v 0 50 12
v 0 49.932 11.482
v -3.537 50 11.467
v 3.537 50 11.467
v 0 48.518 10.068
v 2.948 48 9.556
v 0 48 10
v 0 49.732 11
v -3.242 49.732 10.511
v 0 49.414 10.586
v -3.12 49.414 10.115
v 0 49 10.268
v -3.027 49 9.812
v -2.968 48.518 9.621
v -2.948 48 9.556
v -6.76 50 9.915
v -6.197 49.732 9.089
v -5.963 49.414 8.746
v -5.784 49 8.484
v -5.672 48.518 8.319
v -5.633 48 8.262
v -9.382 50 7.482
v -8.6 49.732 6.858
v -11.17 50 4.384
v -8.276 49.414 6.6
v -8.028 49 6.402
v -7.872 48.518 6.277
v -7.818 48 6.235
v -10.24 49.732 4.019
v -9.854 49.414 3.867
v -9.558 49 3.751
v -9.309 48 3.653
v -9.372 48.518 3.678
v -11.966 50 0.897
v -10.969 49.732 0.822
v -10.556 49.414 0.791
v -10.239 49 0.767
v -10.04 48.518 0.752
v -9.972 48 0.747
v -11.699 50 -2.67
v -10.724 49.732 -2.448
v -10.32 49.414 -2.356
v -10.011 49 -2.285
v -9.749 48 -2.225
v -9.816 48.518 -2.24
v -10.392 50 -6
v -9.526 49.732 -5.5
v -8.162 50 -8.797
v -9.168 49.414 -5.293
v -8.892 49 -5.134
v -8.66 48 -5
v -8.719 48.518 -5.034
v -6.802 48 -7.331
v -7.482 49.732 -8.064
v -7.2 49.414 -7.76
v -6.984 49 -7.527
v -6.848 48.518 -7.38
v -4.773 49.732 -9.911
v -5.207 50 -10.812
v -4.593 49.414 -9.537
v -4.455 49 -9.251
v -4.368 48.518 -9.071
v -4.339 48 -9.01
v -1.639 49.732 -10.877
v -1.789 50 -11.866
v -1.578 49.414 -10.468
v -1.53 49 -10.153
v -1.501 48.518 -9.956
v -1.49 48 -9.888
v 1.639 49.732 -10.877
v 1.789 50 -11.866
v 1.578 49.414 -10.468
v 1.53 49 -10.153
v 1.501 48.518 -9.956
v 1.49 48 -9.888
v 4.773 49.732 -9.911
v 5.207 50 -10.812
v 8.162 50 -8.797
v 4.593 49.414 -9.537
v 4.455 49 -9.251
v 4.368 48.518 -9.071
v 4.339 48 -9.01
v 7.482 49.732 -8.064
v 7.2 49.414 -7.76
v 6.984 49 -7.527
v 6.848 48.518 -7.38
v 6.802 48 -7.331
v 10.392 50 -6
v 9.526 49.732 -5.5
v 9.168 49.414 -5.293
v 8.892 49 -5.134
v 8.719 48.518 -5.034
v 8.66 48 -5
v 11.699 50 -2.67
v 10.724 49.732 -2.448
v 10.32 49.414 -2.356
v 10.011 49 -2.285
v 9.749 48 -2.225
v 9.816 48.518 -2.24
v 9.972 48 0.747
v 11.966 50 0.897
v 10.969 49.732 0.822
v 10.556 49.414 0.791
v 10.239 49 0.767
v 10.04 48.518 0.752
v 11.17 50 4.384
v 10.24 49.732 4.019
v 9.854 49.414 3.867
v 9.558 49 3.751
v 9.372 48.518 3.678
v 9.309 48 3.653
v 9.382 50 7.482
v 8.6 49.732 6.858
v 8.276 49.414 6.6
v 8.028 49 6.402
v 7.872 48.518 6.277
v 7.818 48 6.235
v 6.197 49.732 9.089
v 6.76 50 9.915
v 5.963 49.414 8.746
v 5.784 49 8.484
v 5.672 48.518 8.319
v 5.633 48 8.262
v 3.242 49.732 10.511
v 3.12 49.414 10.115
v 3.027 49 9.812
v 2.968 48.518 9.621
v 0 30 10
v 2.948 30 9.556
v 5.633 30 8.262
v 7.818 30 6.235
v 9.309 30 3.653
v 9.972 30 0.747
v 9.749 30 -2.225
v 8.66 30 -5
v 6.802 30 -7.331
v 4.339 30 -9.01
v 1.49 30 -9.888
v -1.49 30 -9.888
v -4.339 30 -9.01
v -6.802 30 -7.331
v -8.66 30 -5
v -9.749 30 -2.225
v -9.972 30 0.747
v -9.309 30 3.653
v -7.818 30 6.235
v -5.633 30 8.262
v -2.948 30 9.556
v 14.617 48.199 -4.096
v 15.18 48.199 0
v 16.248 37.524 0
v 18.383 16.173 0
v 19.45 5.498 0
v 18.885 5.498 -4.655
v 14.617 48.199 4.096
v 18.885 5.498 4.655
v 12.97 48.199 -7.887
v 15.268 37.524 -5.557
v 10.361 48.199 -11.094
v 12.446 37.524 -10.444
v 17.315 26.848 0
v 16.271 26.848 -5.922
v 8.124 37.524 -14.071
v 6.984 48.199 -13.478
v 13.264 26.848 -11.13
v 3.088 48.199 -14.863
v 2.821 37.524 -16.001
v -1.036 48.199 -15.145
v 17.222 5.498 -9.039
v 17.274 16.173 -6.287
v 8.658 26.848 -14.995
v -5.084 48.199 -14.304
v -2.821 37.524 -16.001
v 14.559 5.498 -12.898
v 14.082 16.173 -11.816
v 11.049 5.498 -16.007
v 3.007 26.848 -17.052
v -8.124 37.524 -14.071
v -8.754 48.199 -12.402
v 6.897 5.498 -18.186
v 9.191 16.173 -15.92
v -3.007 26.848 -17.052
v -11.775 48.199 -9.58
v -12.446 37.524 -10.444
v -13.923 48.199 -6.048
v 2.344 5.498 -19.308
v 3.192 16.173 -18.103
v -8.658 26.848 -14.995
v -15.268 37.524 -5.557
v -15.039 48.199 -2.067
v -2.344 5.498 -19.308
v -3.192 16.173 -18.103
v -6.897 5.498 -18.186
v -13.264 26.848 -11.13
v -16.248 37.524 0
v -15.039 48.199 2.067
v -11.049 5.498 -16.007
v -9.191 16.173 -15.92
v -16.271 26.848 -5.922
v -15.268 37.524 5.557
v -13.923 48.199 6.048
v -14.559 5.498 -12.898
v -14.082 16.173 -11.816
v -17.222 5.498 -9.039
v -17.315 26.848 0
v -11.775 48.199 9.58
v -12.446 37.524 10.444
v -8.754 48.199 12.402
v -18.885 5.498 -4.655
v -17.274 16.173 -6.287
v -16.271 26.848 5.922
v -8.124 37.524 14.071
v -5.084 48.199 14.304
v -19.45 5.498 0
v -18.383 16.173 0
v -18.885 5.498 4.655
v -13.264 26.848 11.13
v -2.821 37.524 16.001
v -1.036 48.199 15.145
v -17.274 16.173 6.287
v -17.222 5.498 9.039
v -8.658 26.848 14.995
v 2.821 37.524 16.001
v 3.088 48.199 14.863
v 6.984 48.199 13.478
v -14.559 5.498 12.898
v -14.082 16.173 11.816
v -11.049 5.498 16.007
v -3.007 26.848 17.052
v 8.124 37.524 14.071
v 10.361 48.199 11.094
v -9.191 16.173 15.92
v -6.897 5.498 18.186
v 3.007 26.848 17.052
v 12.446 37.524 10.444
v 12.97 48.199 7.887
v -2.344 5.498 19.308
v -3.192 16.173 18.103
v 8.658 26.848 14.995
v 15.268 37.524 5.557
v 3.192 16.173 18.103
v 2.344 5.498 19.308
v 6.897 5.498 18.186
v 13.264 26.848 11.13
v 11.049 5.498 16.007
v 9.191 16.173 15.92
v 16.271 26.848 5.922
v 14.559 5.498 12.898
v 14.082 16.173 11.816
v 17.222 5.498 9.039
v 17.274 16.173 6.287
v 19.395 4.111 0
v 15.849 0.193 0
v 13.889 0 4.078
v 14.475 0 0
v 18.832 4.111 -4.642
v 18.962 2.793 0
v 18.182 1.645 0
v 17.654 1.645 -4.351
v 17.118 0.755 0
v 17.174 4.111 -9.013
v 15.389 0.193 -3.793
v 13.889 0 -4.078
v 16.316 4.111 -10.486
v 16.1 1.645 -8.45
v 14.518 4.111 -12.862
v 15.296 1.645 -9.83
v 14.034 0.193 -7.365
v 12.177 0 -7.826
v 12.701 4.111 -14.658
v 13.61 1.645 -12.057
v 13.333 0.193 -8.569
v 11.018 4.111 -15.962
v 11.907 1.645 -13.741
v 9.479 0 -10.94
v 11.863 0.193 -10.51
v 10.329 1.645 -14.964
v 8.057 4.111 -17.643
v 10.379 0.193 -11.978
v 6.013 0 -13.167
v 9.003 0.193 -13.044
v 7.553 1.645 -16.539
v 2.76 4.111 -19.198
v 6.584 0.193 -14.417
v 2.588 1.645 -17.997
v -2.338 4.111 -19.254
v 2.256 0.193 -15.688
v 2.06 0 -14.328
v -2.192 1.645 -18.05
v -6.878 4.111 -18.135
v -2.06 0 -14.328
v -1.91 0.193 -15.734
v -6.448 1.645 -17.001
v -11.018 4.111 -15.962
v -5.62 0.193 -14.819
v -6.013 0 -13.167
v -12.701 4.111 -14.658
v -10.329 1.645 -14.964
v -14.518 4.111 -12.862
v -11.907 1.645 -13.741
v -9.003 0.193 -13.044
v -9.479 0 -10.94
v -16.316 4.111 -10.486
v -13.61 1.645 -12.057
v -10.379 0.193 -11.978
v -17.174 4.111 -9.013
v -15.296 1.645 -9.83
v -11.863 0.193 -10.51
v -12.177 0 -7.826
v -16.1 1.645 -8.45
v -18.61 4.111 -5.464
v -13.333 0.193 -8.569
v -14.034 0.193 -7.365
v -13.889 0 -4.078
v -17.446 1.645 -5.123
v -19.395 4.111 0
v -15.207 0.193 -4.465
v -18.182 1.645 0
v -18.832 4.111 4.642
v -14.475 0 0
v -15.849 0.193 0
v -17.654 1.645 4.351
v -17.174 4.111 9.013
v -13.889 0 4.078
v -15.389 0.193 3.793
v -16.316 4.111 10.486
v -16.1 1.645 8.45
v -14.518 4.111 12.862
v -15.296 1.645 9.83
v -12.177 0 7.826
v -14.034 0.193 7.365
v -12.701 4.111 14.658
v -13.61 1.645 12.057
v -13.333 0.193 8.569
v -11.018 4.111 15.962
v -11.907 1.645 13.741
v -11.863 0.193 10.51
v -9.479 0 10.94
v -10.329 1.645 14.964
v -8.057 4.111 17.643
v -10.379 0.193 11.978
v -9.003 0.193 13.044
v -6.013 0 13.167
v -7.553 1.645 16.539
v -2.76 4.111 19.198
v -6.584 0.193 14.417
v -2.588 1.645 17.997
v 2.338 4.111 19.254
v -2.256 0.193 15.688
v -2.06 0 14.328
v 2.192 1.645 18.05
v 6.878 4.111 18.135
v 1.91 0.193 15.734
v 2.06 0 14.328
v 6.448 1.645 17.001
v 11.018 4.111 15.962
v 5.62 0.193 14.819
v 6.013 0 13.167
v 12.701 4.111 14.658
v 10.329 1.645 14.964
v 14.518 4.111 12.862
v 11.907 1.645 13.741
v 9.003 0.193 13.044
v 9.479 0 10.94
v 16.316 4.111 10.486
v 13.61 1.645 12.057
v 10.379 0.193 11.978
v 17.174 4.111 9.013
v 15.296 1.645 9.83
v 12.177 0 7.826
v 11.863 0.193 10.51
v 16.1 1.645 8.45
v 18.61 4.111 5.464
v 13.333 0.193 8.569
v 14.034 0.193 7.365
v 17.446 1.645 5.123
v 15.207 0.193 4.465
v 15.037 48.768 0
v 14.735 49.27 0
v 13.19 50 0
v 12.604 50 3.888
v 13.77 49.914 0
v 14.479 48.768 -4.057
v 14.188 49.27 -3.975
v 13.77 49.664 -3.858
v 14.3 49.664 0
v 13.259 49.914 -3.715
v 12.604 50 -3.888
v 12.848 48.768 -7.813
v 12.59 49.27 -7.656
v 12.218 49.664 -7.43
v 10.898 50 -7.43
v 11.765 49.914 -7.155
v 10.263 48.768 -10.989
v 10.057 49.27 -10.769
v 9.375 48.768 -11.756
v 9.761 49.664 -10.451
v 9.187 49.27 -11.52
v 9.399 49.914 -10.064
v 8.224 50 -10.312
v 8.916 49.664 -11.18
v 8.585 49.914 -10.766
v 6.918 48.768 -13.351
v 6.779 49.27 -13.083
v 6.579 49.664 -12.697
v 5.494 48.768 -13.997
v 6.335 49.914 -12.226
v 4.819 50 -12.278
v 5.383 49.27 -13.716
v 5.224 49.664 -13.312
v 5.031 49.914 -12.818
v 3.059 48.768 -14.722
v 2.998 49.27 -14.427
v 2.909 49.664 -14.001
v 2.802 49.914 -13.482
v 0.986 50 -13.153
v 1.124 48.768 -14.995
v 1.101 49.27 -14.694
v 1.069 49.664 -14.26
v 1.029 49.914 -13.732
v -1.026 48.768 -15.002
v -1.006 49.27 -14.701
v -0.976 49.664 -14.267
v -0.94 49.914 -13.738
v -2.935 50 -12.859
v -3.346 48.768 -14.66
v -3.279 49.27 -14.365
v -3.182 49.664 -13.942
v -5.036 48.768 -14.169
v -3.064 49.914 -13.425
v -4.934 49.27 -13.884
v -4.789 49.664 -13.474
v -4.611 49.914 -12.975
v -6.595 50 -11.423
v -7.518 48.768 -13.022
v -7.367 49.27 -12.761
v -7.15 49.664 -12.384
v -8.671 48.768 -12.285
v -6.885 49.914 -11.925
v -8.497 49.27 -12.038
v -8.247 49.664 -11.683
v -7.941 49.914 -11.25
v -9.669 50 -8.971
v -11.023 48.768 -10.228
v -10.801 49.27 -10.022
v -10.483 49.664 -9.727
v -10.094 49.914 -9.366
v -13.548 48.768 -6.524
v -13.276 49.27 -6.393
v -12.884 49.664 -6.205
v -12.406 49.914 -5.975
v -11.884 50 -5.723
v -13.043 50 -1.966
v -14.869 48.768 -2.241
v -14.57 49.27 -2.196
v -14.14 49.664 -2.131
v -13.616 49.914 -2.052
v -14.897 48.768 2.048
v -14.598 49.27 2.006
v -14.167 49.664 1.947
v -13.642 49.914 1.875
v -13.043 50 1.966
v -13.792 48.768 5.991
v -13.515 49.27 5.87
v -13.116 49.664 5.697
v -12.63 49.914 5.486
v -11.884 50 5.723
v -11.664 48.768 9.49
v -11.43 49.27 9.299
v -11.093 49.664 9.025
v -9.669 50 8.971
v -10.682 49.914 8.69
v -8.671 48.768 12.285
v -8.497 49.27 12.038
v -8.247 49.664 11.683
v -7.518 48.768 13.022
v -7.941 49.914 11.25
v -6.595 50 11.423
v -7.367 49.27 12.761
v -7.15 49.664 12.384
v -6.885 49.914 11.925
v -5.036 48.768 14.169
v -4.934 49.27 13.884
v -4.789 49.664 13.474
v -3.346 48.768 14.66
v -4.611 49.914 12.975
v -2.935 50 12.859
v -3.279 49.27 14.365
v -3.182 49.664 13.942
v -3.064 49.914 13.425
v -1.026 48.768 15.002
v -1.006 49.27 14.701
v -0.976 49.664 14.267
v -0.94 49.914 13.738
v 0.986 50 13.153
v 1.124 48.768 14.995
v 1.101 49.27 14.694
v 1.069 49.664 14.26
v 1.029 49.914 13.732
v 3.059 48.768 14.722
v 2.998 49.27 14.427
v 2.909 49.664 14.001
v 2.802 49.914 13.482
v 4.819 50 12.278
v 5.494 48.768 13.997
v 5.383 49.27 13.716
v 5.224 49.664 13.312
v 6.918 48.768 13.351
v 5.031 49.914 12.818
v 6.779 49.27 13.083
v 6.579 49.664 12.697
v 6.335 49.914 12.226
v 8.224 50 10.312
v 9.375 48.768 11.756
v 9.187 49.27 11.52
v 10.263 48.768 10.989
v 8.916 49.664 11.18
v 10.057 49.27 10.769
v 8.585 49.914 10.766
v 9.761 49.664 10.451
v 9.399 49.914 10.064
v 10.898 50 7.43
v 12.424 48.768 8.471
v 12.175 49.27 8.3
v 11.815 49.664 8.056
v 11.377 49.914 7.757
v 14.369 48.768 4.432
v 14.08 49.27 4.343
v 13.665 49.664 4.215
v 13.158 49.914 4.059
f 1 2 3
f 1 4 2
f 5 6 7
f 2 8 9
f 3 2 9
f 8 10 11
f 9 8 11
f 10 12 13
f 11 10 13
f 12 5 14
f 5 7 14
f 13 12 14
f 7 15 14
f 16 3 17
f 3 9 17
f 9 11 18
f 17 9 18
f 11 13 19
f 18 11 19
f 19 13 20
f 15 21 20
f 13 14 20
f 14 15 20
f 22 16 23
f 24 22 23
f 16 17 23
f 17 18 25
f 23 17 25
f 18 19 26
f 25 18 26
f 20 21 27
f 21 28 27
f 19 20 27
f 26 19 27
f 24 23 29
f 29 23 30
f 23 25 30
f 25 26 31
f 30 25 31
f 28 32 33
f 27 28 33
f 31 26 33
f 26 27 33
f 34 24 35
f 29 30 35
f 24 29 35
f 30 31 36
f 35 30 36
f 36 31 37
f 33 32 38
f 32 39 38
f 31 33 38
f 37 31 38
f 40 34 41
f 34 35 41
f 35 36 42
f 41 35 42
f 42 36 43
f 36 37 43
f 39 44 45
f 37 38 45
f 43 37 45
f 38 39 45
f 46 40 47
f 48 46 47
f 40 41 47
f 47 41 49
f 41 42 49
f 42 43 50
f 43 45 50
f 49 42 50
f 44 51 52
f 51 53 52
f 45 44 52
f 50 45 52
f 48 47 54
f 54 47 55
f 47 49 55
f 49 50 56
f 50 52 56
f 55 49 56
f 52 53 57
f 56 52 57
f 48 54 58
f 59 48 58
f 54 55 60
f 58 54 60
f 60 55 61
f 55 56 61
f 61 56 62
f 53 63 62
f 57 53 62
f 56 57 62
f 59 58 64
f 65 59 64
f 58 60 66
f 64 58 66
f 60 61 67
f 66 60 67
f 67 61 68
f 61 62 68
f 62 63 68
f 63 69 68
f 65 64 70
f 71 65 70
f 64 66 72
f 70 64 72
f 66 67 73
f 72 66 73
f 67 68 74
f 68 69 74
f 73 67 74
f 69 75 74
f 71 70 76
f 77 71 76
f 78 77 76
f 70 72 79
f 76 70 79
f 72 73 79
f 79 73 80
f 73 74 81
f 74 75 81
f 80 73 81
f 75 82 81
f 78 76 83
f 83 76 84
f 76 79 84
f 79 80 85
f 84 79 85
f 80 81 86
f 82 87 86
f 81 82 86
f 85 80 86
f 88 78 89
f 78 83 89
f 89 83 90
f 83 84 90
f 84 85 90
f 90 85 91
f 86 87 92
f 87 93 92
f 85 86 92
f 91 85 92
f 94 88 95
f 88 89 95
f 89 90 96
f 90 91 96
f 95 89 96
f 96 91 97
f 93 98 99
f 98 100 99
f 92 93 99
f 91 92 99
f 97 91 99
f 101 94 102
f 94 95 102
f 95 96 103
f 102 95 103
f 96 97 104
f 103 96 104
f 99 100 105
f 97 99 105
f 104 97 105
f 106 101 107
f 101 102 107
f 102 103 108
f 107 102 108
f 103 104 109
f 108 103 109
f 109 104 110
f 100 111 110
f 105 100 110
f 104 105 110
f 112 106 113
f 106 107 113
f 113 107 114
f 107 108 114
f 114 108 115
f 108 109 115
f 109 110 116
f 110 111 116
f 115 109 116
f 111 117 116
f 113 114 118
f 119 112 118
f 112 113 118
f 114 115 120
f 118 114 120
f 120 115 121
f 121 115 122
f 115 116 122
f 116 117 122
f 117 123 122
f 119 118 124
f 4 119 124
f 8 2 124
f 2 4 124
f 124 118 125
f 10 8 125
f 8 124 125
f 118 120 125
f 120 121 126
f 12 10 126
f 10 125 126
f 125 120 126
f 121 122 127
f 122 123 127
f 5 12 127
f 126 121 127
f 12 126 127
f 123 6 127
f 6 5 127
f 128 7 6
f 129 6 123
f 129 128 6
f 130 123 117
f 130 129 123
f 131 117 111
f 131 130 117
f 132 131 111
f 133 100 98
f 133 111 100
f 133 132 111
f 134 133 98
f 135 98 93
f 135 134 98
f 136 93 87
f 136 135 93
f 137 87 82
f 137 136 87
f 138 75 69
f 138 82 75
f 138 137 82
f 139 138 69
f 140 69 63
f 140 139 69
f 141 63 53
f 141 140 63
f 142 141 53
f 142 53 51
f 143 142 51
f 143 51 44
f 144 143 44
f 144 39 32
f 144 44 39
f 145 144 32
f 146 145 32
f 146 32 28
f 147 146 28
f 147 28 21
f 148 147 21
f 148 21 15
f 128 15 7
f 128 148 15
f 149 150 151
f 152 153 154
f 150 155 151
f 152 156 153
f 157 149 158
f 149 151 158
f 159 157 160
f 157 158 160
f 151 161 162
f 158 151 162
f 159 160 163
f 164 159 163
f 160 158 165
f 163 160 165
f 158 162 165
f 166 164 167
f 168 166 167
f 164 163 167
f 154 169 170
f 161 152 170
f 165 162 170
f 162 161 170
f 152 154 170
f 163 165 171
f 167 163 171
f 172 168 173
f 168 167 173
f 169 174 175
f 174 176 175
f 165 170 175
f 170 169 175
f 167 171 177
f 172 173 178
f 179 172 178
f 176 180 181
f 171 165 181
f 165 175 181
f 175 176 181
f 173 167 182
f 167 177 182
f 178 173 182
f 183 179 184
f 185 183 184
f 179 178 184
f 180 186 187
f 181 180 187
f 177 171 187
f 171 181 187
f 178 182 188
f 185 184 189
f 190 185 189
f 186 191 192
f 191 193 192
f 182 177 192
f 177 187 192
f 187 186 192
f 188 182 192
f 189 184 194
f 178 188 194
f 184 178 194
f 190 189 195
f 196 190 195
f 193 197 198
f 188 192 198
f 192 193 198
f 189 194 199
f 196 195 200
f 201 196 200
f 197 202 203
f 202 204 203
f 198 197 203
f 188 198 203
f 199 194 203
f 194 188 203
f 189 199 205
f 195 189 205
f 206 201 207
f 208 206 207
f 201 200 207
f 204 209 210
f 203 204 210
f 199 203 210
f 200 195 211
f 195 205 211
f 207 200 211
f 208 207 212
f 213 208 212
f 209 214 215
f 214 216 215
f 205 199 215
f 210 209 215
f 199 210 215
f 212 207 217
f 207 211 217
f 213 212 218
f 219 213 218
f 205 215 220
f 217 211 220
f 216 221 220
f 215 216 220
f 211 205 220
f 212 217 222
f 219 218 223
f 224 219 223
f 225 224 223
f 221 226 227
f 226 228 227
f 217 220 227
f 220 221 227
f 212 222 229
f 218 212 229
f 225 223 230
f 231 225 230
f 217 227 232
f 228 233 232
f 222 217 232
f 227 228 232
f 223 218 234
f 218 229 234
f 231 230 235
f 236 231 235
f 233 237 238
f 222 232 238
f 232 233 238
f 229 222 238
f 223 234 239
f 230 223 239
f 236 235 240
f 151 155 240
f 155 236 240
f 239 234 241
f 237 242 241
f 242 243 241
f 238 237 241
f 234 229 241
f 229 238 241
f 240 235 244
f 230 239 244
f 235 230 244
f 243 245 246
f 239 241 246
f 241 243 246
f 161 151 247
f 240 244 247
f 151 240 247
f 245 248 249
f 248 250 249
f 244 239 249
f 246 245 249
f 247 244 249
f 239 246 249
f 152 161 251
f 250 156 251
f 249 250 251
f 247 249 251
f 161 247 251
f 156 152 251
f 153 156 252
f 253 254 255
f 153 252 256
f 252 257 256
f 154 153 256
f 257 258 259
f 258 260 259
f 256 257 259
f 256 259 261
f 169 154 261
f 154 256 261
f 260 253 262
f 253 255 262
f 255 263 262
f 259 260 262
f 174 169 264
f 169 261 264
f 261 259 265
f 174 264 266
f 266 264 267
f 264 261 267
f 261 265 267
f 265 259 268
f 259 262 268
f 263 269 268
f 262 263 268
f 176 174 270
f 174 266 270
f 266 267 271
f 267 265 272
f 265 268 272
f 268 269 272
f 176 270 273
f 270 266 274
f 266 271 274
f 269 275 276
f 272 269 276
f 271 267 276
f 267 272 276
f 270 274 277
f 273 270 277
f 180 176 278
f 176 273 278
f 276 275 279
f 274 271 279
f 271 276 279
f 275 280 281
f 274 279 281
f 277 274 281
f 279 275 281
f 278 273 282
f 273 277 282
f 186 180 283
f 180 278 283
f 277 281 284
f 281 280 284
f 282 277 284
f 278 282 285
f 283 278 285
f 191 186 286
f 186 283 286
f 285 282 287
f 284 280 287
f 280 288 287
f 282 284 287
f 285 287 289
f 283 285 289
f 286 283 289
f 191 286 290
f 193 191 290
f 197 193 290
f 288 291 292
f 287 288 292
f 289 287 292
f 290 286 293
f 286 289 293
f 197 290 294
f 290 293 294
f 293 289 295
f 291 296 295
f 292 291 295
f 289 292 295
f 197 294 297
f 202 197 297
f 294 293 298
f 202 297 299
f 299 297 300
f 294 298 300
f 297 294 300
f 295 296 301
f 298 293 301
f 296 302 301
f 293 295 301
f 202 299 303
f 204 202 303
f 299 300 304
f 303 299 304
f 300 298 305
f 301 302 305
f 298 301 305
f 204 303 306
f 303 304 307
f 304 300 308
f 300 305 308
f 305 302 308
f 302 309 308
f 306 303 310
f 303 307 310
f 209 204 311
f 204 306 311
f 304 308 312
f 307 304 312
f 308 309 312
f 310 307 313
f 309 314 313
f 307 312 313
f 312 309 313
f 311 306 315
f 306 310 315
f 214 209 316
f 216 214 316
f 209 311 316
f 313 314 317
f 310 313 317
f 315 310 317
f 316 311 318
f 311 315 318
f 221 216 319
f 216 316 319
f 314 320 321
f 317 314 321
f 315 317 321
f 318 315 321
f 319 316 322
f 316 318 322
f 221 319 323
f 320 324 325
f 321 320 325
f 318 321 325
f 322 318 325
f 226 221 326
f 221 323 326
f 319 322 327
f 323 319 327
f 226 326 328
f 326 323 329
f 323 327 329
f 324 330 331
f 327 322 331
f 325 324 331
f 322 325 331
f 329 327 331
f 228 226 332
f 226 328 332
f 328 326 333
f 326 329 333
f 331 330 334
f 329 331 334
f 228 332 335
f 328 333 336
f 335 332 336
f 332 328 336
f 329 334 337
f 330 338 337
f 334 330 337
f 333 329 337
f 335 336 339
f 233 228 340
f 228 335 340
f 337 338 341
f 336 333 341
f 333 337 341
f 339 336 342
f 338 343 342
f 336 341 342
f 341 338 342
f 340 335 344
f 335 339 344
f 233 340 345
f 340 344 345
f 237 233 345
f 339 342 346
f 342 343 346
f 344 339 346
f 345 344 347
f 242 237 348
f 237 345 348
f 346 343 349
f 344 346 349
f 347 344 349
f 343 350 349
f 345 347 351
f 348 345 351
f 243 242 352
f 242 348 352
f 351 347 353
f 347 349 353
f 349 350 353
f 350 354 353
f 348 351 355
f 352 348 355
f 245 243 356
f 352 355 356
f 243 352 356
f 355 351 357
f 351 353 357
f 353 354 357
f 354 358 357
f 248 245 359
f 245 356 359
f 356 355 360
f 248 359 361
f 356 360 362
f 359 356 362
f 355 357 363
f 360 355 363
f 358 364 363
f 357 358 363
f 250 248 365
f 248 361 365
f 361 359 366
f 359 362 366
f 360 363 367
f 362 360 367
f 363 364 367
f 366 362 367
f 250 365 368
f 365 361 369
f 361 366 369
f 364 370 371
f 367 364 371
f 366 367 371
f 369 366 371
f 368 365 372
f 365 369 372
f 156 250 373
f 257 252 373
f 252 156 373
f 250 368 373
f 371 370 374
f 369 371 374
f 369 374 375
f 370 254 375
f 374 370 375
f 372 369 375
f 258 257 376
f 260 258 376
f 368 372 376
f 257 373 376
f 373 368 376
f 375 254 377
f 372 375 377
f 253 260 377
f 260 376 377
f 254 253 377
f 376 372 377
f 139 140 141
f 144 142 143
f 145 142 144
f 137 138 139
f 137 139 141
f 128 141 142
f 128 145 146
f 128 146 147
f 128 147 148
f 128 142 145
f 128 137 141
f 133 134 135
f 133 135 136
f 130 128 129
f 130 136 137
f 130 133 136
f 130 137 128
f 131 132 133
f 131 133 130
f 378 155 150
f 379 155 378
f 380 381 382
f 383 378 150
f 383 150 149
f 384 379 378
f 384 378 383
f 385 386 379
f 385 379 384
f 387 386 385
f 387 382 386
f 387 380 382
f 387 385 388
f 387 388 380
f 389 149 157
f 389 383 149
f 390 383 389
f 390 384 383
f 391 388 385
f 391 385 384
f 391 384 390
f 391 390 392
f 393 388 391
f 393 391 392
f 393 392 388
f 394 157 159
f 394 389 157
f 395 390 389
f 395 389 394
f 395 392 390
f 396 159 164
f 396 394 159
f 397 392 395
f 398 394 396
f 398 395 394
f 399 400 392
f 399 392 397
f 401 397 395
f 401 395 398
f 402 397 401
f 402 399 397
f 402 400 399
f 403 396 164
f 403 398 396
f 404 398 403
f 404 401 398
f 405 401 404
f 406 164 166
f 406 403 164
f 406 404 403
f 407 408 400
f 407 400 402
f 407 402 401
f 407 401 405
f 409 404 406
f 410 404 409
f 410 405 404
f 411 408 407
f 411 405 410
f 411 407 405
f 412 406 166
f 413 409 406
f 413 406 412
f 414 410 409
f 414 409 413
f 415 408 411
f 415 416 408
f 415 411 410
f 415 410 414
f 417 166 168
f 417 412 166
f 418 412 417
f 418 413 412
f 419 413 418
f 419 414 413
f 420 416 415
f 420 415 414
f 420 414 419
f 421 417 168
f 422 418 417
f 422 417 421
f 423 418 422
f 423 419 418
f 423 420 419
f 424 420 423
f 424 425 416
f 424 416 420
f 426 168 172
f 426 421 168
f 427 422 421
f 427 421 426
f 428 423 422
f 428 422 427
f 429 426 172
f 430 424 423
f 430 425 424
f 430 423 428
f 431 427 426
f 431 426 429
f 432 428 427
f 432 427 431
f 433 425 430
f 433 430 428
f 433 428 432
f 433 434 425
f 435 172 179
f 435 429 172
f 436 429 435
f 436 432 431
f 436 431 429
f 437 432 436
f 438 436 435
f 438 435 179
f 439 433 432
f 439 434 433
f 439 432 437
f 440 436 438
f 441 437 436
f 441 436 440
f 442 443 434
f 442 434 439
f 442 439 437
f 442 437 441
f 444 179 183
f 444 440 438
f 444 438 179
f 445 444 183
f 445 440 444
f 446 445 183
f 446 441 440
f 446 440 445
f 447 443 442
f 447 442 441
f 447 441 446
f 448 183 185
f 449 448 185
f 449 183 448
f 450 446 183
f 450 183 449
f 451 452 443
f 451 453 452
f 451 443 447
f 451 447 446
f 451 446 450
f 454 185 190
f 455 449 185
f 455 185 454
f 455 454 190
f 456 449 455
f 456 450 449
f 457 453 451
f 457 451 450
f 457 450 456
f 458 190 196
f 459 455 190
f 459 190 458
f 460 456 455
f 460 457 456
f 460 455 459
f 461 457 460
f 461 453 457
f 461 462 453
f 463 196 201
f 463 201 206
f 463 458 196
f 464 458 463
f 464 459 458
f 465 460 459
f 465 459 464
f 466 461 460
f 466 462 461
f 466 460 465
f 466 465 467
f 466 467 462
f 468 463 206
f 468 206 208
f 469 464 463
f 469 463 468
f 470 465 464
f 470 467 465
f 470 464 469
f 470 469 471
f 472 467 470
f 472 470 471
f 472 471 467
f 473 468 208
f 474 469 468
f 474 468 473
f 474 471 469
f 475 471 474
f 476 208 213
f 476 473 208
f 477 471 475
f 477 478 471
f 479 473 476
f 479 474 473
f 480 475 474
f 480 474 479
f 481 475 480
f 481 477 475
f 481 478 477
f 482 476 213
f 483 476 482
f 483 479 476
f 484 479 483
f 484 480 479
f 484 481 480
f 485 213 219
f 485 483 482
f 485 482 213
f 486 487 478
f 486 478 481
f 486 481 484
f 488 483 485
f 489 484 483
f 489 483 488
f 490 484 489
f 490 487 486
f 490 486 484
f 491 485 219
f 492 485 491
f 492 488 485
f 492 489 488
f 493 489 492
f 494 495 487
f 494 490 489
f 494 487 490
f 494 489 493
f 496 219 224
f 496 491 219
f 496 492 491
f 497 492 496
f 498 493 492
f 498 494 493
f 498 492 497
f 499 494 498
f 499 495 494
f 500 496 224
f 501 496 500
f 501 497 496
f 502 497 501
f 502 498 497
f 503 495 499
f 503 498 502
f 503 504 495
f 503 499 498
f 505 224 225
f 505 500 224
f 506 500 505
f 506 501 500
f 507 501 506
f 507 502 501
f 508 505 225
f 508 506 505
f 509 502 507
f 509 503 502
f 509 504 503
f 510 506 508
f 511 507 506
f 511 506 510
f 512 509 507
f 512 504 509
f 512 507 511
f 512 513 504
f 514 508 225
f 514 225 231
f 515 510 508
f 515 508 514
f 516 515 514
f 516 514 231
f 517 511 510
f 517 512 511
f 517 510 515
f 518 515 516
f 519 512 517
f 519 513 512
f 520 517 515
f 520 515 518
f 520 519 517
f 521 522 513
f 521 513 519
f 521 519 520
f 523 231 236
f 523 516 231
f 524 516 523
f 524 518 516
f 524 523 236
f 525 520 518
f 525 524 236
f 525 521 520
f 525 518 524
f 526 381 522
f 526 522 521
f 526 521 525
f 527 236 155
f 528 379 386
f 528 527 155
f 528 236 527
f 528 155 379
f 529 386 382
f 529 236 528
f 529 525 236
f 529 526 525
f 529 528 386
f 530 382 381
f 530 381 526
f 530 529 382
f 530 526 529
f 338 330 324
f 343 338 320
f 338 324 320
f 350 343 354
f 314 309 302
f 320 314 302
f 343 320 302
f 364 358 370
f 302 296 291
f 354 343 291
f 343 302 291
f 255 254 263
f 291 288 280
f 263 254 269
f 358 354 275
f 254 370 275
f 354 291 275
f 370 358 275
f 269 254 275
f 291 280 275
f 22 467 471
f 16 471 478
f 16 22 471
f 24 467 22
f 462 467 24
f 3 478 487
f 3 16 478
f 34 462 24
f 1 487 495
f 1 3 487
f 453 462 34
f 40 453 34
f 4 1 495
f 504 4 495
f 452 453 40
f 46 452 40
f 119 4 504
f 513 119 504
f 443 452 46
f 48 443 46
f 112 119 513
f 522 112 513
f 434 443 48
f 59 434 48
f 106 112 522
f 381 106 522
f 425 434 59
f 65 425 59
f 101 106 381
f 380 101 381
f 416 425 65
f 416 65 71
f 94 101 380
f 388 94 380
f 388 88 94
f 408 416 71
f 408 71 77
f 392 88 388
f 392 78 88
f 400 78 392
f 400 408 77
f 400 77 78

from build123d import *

# Parameters (mm, degrees)
SKETCH2_R               = 15
SKETCH1_R               = 20
CUT_EXTRUDE1_DEPTH      = 58.445626622
CUT_EXTRUDE1_DEPTH_BACK = 20
SKETCH3_R               = 10
FILLET1_R               = 5
FILLET2_R               = 2


with BuildPart() as part:
    # Sketch2 → Loft1 section 0
    with BuildSketch(Plane(origin=(0, 50, 0), x_dir=(1, 0, 0), z_dir=(0, 1, 0))):
        Circle(SKETCH2_R)
    # Sketch1 → Loft1 section 1
    with BuildSketch(Plane(origin=(0, 0, 0), x_dir=(1, 0, 0), z_dir=(0, 1, 0))):
        Circle(SKETCH1_R)
    loft()

    # Sketch3 → Cut-Extrude1 (cut, two sides: drawn at the far end of the back side and taken through both)
    with BuildSketch(Plane(origin=(0, 50, 0), x_dir=(1, 0, 0), z_dir=(0, 1, 0)).offset(-CUT_EXTRUDE1_DEPTH_BACK)):
        with Locations(Location((0, 0, 0), (0, 0, 270))):
            Circle(SKETCH3_R)
    extrude(amount=CUT_EXTRUDE1_DEPTH + CUT_EXTRUDE1_DEPTH_BACK, mode=Mode.SUBTRACT)

    # Fillet1
    fillet1_edges = [part.edges().sort_by_distance(p)[0] for p in [
        (-20, 0, 0),
    ]]
    fillet(fillet1_edges, radius=FILLET1_R)

    # Fillet2
    fillet2_edges = [part.edges().sort_by_distance(p)[0] for p in [
        (-15, 50, 0),
        (0, 50, -10),
    ]]
    fillet(fillet2_edges, radius=FILLET2_R)


solid = part.part
